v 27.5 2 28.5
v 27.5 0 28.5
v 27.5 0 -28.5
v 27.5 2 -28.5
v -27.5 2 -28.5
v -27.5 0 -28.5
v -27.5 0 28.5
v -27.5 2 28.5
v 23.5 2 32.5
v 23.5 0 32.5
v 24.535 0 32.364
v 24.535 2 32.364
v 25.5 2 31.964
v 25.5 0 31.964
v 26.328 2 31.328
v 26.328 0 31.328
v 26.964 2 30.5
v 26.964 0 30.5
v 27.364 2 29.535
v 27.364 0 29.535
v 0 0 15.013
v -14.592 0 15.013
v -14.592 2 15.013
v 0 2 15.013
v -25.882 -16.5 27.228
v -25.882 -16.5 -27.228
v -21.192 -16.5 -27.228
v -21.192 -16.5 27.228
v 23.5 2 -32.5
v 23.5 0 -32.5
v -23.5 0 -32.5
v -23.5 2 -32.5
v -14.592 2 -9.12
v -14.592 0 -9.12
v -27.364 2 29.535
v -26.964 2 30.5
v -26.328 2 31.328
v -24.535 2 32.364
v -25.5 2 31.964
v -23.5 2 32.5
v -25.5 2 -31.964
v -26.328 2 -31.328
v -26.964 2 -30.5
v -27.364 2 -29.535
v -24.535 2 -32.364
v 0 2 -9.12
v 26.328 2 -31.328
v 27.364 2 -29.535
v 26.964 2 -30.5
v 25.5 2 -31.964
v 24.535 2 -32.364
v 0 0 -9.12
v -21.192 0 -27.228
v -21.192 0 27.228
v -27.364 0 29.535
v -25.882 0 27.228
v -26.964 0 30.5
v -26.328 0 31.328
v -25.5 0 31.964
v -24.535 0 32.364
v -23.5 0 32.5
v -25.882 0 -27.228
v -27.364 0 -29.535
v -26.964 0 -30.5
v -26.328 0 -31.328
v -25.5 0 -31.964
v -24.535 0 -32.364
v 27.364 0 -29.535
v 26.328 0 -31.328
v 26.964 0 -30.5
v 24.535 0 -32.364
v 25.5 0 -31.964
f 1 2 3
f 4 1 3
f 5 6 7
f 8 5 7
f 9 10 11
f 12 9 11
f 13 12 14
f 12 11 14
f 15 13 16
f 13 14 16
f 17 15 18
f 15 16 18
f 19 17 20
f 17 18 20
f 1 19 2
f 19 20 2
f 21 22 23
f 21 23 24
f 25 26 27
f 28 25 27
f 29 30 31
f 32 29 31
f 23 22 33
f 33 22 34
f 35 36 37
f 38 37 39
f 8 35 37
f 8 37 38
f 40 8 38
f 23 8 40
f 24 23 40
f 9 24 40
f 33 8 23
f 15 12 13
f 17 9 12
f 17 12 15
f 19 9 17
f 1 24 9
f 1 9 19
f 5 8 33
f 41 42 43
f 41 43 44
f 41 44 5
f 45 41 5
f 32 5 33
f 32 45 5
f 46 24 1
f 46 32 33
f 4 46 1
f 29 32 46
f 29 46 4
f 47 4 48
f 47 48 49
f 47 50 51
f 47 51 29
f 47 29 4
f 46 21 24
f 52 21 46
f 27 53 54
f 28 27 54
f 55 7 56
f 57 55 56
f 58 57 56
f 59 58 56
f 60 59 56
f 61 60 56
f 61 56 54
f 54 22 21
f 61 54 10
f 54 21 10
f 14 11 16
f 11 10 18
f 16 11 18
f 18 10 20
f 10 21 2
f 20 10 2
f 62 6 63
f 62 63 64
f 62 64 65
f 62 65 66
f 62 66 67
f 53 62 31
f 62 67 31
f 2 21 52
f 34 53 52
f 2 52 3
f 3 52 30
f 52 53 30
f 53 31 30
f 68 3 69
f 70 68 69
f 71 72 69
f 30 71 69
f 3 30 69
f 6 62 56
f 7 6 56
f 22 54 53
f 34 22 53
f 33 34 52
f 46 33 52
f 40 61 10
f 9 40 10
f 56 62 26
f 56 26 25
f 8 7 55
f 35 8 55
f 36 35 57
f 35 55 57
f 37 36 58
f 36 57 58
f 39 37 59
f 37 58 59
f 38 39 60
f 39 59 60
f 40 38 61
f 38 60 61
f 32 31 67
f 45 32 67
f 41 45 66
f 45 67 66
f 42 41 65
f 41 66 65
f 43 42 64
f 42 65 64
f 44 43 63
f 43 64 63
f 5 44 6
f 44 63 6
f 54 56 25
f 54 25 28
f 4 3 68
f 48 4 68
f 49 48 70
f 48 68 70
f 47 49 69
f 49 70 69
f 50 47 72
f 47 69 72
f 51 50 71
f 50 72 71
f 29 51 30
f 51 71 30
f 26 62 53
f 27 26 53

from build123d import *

# Parameters (mm, degrees)
SKETCH_1_W      = 14.591836735
SKETCH_1_H      = 24.132653061
EXTRUDE_1_DEPTH = 2
SKETCH_2_W      = 4.690013975
SKETCH_2_H      = 54.456273374
EXTRUDE_2_DEPTH = 16.5


with BuildPart() as part:
    # 草图1 → 凸台-拉伸1 (new body)
    with BuildSketch(Plane(origin=(0, 0, 0), x_dir=(1, 0, 0), z_dir=(0, 1, 0))):
        with BuildLine():
            Line((-23.5, -32.5), (23.5, -32.5))
            ThreePointArc((23.5, -32.5), (26.328427125, -31.328427125), (27.5, -28.5))
            Line((27.5, -28.5), (27.5, 28.5))
            ThreePointArc((27.5, 28.5), (26.328427125, 31.328427125), (23.5, 32.5))
            Line((23.5, 32.5), (-23.5, 32.5))
            ThreePointArc((-23.5, 32.5), (-26.328427125, 31.328427125), (-27.5, 28.5))
            Line((-27.5, 28.5), (-27.5, -28.5))
            ThreePointArc((-27.5, -28.5), (-26.328427125, -31.328427125), (-23.5, -32.5))
        make_face()
        with Locations((-7.295918368, -2.946428572)):
            Rectangle(SKETCH_1_W, SKETCH_1_H, mode=Mode.SUBTRACT)
    extrude(amount=EXTRUDE_1_DEPTH)

    # 草图2 → 凸台-拉伸2 (add)
    with BuildSketch(Plane.XZ):
        with Locations((-23.536921985, 0)):
            Rectangle(SKETCH_2_W, SKETCH_2_H)
    extrude(amount=EXTRUDE_2_DEPTH)


solid = part.part
